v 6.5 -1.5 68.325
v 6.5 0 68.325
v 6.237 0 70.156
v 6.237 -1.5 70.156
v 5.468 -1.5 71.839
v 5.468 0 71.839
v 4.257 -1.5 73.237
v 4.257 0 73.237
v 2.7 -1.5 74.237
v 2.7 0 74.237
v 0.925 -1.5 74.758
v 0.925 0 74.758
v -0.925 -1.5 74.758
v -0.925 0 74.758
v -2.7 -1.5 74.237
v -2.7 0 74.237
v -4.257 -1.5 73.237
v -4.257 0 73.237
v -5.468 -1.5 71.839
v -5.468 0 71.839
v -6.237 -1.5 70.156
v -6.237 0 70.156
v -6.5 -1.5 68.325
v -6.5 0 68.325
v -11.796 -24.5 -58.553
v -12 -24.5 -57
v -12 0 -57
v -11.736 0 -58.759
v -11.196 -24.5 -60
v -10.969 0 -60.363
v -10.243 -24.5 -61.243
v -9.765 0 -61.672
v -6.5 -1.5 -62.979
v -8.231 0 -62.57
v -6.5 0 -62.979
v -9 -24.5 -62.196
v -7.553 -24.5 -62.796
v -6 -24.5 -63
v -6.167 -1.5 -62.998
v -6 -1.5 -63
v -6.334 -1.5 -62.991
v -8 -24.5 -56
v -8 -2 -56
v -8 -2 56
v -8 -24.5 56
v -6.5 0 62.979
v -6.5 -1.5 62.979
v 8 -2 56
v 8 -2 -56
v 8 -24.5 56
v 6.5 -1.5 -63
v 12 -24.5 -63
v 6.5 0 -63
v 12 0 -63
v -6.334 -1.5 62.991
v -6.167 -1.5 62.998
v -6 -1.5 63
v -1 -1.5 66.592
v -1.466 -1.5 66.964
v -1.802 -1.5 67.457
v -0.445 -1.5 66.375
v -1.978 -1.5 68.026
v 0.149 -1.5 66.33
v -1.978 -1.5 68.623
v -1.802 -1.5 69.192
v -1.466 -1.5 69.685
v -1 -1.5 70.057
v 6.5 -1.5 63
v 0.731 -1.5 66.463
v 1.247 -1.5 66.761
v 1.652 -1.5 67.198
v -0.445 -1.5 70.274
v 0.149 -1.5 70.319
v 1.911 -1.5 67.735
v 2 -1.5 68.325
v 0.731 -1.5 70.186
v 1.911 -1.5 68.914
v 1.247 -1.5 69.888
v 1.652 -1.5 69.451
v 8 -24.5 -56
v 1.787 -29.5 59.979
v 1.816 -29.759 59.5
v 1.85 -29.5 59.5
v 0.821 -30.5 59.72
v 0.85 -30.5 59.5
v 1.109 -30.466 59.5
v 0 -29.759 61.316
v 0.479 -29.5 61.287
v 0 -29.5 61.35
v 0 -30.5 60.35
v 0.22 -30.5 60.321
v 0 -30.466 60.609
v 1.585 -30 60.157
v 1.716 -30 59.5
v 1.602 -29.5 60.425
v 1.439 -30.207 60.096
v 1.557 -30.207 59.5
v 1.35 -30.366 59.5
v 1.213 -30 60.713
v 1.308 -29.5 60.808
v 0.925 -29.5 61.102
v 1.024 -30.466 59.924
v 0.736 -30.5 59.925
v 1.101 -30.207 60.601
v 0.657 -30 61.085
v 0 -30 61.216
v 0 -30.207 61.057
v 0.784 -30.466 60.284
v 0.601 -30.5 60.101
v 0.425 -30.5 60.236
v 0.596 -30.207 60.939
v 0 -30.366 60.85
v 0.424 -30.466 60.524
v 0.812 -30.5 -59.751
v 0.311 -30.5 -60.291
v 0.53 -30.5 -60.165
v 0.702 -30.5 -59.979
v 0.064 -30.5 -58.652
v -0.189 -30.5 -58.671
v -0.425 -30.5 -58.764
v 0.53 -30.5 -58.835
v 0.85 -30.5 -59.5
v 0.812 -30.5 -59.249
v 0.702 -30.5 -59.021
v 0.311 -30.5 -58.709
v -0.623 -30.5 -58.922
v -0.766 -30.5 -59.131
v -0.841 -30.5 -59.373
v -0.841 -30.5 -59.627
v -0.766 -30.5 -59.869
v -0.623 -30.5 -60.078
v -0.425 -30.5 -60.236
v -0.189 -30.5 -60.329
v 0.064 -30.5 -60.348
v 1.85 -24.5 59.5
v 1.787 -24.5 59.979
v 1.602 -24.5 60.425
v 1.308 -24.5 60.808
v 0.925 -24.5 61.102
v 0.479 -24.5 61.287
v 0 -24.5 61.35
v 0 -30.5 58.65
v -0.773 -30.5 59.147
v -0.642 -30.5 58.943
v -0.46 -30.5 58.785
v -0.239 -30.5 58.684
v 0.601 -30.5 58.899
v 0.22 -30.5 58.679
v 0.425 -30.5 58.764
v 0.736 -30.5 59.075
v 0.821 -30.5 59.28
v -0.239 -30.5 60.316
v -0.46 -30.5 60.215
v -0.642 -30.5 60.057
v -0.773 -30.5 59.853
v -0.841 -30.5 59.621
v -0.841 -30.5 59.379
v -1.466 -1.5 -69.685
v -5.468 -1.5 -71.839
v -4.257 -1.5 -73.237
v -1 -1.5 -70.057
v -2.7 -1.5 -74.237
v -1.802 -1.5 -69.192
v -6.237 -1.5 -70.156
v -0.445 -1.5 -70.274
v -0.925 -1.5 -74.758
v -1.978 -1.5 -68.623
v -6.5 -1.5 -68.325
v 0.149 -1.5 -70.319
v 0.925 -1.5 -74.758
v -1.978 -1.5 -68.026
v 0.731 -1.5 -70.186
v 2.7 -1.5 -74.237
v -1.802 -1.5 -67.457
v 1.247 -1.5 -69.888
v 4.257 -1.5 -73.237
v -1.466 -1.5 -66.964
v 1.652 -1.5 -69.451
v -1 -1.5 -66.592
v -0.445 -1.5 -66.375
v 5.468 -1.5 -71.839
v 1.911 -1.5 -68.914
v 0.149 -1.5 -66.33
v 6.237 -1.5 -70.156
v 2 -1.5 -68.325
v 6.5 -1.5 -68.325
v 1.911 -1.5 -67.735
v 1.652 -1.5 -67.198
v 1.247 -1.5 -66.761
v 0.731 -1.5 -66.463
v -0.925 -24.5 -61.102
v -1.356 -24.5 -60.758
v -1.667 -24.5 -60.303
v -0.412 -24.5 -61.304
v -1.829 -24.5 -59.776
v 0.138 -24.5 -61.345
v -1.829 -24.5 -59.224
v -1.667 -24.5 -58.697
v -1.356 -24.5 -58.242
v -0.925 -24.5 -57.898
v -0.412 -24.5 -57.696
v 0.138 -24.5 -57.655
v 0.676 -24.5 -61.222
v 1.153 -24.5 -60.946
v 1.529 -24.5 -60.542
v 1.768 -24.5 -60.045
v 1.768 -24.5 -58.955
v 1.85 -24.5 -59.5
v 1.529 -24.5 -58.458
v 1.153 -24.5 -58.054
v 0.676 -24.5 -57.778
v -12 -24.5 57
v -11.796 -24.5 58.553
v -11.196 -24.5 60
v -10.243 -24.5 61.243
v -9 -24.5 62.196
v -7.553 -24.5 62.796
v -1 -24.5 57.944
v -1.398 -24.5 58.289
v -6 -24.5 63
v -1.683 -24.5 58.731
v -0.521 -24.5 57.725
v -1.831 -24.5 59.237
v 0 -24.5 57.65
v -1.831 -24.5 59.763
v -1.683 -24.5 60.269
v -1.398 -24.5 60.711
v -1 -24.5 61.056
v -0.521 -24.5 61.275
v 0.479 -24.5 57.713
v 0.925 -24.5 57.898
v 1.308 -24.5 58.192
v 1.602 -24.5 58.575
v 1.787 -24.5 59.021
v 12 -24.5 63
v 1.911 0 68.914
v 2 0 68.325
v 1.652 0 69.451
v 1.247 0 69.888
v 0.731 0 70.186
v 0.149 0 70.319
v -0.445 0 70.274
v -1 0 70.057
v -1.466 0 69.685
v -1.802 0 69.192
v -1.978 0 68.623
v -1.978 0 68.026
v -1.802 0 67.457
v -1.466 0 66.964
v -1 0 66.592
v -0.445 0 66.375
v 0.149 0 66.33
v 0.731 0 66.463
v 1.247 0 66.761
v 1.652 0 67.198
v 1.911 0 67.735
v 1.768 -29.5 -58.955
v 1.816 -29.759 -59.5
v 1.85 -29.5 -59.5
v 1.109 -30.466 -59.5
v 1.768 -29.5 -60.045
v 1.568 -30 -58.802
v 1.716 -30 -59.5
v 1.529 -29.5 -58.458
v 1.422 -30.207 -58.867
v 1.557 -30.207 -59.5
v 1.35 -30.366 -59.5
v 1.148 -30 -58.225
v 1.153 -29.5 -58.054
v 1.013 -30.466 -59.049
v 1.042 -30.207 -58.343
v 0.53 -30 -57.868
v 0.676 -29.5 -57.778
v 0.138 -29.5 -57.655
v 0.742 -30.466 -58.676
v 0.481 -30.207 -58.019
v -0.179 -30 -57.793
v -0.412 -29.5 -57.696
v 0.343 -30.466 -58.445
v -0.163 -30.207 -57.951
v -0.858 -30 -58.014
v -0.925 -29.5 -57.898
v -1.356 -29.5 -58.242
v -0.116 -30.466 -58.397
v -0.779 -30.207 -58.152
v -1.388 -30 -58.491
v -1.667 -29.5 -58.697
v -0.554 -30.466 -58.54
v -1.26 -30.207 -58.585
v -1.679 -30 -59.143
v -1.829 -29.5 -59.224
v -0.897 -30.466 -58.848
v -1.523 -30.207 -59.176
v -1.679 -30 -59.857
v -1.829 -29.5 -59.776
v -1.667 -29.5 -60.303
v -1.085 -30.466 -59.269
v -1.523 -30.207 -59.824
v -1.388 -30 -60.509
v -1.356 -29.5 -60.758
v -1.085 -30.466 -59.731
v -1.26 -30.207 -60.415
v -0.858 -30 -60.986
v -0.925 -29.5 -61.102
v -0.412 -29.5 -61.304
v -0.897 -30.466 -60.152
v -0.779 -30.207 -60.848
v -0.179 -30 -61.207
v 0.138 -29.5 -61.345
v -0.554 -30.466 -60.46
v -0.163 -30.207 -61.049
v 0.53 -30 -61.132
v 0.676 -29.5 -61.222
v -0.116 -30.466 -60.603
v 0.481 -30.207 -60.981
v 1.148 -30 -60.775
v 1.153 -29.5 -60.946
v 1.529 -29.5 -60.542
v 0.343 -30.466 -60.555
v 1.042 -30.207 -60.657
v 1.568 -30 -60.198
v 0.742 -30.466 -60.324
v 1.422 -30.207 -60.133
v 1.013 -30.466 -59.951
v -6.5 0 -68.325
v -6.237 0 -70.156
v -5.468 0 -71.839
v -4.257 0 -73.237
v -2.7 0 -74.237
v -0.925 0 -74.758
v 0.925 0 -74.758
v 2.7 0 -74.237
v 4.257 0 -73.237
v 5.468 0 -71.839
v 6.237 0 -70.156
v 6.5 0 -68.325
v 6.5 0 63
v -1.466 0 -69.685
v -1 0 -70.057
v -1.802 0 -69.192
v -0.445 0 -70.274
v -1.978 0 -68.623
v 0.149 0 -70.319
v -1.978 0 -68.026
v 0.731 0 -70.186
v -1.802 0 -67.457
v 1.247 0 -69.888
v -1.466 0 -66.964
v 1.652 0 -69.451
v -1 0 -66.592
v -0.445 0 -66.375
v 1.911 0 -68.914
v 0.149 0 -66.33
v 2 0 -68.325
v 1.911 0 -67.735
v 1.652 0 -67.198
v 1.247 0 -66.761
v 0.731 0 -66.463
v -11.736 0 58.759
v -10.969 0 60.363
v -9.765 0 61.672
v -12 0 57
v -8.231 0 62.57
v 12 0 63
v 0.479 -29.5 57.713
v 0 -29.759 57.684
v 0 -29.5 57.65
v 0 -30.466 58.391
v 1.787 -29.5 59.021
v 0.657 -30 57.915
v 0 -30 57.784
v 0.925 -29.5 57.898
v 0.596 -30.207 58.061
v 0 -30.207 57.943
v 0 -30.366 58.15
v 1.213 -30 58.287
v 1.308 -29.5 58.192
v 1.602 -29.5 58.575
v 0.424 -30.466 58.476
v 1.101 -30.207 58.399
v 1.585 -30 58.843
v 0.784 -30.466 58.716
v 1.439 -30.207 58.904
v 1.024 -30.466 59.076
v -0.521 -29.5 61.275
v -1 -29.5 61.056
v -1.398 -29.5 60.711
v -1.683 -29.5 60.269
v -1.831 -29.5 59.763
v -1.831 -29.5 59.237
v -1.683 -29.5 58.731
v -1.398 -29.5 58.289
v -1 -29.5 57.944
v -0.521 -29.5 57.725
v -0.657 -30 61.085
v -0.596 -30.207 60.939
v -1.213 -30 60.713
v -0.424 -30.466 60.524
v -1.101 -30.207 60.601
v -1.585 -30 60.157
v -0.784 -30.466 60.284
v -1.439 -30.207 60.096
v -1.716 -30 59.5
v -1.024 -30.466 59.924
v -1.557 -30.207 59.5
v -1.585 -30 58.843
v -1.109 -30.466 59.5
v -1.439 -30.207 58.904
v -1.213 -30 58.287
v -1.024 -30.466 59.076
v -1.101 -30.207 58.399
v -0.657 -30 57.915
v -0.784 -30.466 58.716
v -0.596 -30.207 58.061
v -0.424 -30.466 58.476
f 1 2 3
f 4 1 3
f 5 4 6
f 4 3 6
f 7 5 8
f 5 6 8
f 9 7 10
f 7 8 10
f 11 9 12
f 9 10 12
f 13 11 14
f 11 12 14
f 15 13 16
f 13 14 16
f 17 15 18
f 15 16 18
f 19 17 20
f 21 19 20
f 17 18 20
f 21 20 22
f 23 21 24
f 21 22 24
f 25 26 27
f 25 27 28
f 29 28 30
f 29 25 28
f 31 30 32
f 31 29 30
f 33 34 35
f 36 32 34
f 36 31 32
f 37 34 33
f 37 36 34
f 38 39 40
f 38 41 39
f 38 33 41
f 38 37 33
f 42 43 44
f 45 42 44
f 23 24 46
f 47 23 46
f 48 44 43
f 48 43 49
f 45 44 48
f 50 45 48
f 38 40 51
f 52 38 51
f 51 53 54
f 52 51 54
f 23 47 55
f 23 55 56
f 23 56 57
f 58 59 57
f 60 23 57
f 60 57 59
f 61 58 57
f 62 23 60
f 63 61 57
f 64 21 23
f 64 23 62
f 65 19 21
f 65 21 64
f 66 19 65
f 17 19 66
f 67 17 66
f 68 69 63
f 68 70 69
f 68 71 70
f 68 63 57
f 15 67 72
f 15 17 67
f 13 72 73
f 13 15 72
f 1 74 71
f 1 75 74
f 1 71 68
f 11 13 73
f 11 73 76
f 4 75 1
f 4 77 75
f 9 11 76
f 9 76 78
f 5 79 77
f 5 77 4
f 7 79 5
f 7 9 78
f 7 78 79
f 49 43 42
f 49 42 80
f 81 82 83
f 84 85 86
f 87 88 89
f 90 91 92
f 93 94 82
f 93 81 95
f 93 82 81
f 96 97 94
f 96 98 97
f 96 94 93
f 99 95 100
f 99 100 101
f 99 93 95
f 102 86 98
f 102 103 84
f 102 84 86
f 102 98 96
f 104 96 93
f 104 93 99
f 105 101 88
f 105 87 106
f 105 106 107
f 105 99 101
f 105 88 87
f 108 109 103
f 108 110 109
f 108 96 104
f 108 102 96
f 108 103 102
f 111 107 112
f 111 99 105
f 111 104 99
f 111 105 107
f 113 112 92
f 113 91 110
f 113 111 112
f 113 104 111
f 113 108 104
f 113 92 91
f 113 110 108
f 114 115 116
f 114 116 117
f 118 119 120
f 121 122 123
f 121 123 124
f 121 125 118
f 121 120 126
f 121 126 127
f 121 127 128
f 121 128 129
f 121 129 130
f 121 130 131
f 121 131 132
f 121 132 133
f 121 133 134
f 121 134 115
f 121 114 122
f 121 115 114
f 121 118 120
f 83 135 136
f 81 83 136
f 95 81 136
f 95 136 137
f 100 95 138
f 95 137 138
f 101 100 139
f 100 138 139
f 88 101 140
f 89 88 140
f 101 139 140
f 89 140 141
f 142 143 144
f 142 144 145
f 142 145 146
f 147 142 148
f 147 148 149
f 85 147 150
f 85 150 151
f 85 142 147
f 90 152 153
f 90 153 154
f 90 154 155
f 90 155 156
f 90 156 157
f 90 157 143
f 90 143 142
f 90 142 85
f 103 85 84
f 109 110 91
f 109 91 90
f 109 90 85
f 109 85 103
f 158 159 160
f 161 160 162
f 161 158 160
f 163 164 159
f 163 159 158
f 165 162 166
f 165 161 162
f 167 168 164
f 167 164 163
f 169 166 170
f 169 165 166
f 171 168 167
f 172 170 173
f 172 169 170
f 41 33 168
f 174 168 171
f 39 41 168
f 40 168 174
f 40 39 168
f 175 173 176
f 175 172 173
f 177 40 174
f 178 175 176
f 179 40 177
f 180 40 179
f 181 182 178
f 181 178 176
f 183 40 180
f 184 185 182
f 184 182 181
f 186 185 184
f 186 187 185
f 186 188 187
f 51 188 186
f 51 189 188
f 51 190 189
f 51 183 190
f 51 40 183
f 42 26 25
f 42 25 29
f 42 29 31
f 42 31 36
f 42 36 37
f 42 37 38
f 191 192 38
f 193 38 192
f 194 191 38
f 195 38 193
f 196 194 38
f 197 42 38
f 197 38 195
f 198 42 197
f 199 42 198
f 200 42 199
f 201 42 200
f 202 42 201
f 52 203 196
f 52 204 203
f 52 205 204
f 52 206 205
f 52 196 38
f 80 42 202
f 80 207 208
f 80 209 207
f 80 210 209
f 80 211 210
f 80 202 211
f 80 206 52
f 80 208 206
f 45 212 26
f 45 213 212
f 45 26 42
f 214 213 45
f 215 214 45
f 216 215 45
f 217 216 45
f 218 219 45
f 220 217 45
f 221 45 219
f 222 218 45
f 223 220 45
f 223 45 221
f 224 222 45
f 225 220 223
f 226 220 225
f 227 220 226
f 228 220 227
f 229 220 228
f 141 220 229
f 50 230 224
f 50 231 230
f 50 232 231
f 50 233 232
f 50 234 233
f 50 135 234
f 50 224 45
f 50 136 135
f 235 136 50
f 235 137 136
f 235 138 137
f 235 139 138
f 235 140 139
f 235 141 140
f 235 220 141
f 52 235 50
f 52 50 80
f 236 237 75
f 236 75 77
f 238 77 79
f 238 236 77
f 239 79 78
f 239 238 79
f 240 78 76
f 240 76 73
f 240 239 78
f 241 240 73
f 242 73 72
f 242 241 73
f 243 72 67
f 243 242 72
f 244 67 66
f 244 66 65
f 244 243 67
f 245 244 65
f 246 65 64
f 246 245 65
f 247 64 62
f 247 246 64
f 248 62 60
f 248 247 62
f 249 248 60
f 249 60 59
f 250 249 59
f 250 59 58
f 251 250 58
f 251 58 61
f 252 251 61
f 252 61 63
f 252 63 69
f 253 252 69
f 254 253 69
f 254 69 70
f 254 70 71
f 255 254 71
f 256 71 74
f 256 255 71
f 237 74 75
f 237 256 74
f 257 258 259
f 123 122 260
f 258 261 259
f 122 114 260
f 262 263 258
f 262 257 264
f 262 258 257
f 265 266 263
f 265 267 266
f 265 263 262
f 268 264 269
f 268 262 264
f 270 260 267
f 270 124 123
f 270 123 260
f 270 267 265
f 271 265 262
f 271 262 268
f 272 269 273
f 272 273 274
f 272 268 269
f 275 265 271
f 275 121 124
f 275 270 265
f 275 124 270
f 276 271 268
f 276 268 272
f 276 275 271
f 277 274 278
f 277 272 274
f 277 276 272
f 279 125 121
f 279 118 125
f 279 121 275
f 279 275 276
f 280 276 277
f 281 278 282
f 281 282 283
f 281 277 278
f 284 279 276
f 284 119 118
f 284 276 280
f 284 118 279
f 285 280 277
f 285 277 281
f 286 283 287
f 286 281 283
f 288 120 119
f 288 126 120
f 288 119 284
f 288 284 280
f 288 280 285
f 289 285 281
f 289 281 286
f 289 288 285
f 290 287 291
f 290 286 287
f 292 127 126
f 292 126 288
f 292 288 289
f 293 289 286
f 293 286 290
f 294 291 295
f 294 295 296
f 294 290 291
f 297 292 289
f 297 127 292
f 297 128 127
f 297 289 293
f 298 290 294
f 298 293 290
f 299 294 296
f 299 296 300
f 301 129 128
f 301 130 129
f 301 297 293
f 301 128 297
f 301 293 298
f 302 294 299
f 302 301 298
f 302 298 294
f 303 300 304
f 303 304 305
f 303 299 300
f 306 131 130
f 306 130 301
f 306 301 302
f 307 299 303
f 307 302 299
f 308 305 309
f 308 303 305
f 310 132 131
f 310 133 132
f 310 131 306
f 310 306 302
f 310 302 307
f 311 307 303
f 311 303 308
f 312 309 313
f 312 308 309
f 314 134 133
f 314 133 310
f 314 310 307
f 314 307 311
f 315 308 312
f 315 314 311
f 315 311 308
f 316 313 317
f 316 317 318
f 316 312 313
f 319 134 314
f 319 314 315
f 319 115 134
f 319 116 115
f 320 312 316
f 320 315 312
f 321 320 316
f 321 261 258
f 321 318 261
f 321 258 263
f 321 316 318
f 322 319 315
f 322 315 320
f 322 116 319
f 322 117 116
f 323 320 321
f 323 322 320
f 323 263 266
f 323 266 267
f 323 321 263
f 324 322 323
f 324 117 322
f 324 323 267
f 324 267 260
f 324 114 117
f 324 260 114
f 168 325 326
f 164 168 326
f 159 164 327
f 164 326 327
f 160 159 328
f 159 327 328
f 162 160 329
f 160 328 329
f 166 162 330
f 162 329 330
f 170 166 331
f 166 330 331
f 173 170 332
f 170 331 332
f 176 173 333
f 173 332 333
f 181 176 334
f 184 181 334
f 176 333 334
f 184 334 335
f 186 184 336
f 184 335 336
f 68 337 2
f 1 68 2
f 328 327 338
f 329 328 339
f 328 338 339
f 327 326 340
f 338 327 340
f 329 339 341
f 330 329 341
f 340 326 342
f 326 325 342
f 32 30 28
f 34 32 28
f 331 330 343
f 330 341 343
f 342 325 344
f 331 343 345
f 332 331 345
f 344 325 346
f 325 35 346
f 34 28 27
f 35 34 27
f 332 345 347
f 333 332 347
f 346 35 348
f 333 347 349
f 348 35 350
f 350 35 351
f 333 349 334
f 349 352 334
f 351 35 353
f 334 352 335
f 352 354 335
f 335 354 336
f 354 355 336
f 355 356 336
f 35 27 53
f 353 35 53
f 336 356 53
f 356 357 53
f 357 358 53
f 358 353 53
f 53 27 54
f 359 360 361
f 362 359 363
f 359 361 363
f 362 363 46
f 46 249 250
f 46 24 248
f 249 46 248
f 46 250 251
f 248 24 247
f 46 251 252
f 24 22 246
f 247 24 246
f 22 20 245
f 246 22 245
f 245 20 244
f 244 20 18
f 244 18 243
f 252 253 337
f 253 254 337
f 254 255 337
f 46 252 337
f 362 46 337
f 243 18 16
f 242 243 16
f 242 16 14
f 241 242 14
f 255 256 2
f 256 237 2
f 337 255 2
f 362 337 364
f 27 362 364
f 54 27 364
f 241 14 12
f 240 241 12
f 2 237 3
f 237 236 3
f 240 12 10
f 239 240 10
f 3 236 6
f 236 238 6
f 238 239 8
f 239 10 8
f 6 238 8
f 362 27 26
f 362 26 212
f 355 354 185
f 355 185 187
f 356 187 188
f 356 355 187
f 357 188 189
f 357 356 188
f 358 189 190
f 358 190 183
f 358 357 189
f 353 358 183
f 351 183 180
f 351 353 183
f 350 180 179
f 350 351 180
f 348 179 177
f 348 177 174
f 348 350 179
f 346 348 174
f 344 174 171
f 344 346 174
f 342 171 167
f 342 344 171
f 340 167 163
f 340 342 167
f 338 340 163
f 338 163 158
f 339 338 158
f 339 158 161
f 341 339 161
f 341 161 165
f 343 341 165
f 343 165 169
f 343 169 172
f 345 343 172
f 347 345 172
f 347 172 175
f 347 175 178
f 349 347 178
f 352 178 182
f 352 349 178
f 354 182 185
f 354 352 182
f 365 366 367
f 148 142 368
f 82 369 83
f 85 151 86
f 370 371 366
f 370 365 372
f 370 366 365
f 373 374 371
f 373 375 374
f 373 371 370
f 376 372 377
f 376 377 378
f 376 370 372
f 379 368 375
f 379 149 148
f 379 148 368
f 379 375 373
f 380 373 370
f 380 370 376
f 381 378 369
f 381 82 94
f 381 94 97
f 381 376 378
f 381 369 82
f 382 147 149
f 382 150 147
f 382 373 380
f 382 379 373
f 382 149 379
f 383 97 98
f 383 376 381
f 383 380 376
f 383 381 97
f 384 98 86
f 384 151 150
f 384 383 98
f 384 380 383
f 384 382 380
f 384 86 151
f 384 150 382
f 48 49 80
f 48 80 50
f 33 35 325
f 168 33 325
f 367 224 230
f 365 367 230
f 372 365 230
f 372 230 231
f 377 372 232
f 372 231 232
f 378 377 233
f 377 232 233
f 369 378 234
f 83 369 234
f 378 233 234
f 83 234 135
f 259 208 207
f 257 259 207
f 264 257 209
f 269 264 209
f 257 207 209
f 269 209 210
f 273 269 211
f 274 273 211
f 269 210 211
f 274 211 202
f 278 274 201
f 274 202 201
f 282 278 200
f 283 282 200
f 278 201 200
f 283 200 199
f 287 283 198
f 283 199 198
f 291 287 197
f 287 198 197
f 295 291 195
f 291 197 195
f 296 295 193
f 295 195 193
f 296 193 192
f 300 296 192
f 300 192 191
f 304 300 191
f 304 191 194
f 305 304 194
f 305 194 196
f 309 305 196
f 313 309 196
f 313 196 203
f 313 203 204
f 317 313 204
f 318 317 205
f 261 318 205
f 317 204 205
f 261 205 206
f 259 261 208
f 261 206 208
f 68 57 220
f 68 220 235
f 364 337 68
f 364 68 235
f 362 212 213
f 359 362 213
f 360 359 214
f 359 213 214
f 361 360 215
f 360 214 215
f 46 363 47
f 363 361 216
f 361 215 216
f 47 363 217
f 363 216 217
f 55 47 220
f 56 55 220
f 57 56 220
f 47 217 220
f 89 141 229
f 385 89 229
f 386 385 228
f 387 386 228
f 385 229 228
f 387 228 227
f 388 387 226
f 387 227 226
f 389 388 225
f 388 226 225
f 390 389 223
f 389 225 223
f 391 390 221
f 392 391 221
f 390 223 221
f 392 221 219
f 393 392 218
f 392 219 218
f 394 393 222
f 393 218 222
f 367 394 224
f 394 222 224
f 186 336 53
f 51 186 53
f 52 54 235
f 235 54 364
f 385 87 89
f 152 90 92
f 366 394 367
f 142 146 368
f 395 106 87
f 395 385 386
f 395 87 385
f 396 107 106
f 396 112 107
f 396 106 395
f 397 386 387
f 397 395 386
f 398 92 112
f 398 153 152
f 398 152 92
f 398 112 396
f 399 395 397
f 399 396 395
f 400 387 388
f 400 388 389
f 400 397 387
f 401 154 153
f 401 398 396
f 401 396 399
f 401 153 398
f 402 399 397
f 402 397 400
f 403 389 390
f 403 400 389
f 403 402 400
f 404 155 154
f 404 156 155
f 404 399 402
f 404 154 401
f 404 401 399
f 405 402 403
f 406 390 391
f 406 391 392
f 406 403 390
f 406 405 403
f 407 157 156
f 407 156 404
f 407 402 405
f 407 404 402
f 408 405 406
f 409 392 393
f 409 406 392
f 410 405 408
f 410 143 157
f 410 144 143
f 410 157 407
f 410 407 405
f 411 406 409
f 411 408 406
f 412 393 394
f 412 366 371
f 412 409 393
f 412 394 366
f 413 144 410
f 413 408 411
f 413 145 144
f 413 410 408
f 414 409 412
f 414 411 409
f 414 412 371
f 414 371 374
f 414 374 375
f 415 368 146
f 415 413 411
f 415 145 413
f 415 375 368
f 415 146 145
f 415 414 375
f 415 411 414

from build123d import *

# Parameters (mm, degrees)
F0_W     = 24
F0_H     = 126
F0_W_2   = 16
F0_H_2   = 112
F1_DEPTH = 24.5
F2_DEPTH = 2
F3_R     = 1.85
F4_DEPTH = 6
F5_R     = 6
F6_R     = 2
F7_DEPTH = 1.5
F8_R     = 1


with BuildPart() as f1:
    # F0 (on Front) → F1 (new body)
    with BuildSketch(Plane.XZ):
        Rectangle(F0_W, F0_H)
        Rectangle(F0_W_2, F0_H_2, mode=Mode.SUBTRACT)
    extrude(amount=F1_DEPTH)

    # F0 (on Front) → F2 (join)
    with BuildSketch(Plane.XZ):
        Rectangle(F0_W_2, F0_H_2)
    extrude(amount=F2_DEPTH)

    # F3 (on face) → F4 (join)
    with BuildSketch(Plane.XZ.offset(24.5)):
        with BuildLine():
            ThreePointArc((0, 57.65), (1.3081475452, 58.1918524548), (1.85, 59.5))
            ThreePointArc((1.85, 59.5), (1.3081475452, 60.8081475452), (0, 61.35))
            Line((0, 61.35), (0, 57.65))
        make_face()
        with BuildLine():
            Line((0, 57.65), (0, 61.35))
            ThreePointArc((0, 61.35), (-1.85, 59.5), (0, 57.65))
        make_face()
        with Locations((0, -59.5)):
            Circle(F3_R)
    extrude(amount=F4_DEPTH)

    # F5
    f5_edges = [f1.edges().sort_by_distance(p)[0] for p in [
        (-12, -12.25, -63),
        (-12, -12.25, 63),
    ]]
    fillet(f5_edges, radius=F5_R)

    # F6 (on Front) → F7 (join)
    with BuildSketch(Plane.XZ):
        with BuildLine():
            Line((6.5, 63), (6.5, 68.3245120645))
            ThreePointArc((6.5, 68.3245120645), (0, 74.8245120645), (-6.5, 68.3245120645))
            Line((-6.5, 68.3245120645), (-6.5, 63))
            Line((-6.5, 63), (-6, 63))
            Line((-6, 63), (6.5, 63))
        make_face()
        with Locations((0, 68.3245120645)):
            Circle(F6_R, mode=Mode.SUBTRACT)
        with BuildLine():
            ThreePointArc((-6.5, 62.9791303716), (-6.2502176759, 62.9947803225), (-6, 63))
            Line((-6, 63), (-6.5, 63))
            Line((-6.5, 63), (-6.5, 62.9791303716))
        make_face()
        with BuildLine():
            ThreePointArc((-6.5, -68.3245120645), (0, -74.8245120645), (6.5, -68.3245120645))
            Line((6.5, -68.3245120645), (6.5, -63))
            Line((6.5, -63), (-6, -63))
            ThreePointArc((-6, -63), (-6.2502176759, -62.9947803225), (-6.5, -62.9791303716))
            Line((-6.5, -62.9791303716), (-6.5, -68.3245120645))
        make_face()
        with Locations((0, -68.3245120645)):
            Circle(F6_R, mode=Mode.SUBTRACT)
    extrude(amount=F7_DEPTH)

    # F8
    f8_edges = [f1.edges().sort_by_distance(p)[0] for p in [
        (-1.85, -30.5, 59.5),
        (-1.85, -30.5, -59.5),
    ]]
    fillet(f8_edges, radius=F8_R)


solid = f1.part
